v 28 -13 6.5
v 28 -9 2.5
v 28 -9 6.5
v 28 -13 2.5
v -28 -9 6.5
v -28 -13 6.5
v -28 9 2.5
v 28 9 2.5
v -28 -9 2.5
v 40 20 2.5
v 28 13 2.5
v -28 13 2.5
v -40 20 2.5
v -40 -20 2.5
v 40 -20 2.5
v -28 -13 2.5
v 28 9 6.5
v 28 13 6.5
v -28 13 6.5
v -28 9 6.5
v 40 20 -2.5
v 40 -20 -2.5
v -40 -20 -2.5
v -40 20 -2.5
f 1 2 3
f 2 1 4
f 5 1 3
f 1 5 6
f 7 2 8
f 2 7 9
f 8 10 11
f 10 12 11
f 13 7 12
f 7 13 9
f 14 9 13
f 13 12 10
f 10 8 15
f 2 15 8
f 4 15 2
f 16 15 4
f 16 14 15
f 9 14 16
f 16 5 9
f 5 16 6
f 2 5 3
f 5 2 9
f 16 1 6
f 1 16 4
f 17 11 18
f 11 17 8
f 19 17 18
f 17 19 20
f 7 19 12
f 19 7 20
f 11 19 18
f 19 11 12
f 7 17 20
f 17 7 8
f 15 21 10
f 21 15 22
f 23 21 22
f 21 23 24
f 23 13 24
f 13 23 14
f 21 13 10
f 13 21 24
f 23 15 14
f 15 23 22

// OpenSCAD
// === Parametric Variables ===
base_length = 80;
base_width = 40;
base_thickness = 5;

rib_height = 4;
rib_width = 4;
rib_margin = 12; // inset from each end for rib length
rib_spacing = 22; // center-to-center distance between ribs

hole_upper_dia = 8;   // diameter of shallow upper recess
hole_lower_dia = 4.5;  // diameter of deeper through-hole
hole_upper_depth = 2;  // depth of shallow recess from top surface
hole_through = base_thickness + rib_height + 2; // total cut depth (clears everything)

// X positions of the three holes (near the ends)
hole_x1 = 15;
hole_x2 = 40;
hole_x3 = 65;
// Y position centered on base width
hole_y_offset = 0;

$fn = 100;

// === Main Assembly ===
difference() {
    union() {
        // Base plate
        base_plate();
        // Two lengthwise ribs on top face
        ribs();
    }
    // Subtract the three stepped circular openings
    stepped_holes();
}

// === Module: Base Plate ===
module base_plate() {
    cube([base_length, base_width, base_thickness], center=true);
}

// === Module: Two Parallel Lengthwise Ribs ===
module ribs() {
    rib_length = base_length - 2 * rib_margin;
    // Translate ribs to sit on top of base plate
    translate([0, -rib_spacing/2, base_thickness/2])
        rib(rib_length);
    translate([0, rib_spacing/2, base_thickness/2])
        rib(rib_length);
}

module rib(length) {
    translate([0, 0, rib_height/2])
        cube([length, rib_width, rib_height], center=true);
}

// === Module: Three Stepped Holes ===
module stepped_holes() {
    positions = [hole_x1, hole_x2, hole_x3];
    for (i = [0:len(positions)-1]) {
        translate([positions[i], hole_y_offset, 0])
            stepped_hole();
    }
}

module stepped_hole() {
    top_z = base_thickness/2 + rib_height + 1; // start above top of ribs
    bottom_z = -(base_thickness/2 + 1);         // go below bottom of base

    // Shallow upper recess (wider, from top surface down)
    translate([0, 0, top_z])
        cylinder(h=hole_upper_depth + 1, d=hole_upper_dia, center=false);

    // Deep through-hole (narrower, cuts entirely through)
    translate([0, 0, top_z - hole_upper_depth])
        cylinder(h=top_z - bottom_z + hole_upper_depth + 1,
                 d=hole_lower_dia, center=false);
}
